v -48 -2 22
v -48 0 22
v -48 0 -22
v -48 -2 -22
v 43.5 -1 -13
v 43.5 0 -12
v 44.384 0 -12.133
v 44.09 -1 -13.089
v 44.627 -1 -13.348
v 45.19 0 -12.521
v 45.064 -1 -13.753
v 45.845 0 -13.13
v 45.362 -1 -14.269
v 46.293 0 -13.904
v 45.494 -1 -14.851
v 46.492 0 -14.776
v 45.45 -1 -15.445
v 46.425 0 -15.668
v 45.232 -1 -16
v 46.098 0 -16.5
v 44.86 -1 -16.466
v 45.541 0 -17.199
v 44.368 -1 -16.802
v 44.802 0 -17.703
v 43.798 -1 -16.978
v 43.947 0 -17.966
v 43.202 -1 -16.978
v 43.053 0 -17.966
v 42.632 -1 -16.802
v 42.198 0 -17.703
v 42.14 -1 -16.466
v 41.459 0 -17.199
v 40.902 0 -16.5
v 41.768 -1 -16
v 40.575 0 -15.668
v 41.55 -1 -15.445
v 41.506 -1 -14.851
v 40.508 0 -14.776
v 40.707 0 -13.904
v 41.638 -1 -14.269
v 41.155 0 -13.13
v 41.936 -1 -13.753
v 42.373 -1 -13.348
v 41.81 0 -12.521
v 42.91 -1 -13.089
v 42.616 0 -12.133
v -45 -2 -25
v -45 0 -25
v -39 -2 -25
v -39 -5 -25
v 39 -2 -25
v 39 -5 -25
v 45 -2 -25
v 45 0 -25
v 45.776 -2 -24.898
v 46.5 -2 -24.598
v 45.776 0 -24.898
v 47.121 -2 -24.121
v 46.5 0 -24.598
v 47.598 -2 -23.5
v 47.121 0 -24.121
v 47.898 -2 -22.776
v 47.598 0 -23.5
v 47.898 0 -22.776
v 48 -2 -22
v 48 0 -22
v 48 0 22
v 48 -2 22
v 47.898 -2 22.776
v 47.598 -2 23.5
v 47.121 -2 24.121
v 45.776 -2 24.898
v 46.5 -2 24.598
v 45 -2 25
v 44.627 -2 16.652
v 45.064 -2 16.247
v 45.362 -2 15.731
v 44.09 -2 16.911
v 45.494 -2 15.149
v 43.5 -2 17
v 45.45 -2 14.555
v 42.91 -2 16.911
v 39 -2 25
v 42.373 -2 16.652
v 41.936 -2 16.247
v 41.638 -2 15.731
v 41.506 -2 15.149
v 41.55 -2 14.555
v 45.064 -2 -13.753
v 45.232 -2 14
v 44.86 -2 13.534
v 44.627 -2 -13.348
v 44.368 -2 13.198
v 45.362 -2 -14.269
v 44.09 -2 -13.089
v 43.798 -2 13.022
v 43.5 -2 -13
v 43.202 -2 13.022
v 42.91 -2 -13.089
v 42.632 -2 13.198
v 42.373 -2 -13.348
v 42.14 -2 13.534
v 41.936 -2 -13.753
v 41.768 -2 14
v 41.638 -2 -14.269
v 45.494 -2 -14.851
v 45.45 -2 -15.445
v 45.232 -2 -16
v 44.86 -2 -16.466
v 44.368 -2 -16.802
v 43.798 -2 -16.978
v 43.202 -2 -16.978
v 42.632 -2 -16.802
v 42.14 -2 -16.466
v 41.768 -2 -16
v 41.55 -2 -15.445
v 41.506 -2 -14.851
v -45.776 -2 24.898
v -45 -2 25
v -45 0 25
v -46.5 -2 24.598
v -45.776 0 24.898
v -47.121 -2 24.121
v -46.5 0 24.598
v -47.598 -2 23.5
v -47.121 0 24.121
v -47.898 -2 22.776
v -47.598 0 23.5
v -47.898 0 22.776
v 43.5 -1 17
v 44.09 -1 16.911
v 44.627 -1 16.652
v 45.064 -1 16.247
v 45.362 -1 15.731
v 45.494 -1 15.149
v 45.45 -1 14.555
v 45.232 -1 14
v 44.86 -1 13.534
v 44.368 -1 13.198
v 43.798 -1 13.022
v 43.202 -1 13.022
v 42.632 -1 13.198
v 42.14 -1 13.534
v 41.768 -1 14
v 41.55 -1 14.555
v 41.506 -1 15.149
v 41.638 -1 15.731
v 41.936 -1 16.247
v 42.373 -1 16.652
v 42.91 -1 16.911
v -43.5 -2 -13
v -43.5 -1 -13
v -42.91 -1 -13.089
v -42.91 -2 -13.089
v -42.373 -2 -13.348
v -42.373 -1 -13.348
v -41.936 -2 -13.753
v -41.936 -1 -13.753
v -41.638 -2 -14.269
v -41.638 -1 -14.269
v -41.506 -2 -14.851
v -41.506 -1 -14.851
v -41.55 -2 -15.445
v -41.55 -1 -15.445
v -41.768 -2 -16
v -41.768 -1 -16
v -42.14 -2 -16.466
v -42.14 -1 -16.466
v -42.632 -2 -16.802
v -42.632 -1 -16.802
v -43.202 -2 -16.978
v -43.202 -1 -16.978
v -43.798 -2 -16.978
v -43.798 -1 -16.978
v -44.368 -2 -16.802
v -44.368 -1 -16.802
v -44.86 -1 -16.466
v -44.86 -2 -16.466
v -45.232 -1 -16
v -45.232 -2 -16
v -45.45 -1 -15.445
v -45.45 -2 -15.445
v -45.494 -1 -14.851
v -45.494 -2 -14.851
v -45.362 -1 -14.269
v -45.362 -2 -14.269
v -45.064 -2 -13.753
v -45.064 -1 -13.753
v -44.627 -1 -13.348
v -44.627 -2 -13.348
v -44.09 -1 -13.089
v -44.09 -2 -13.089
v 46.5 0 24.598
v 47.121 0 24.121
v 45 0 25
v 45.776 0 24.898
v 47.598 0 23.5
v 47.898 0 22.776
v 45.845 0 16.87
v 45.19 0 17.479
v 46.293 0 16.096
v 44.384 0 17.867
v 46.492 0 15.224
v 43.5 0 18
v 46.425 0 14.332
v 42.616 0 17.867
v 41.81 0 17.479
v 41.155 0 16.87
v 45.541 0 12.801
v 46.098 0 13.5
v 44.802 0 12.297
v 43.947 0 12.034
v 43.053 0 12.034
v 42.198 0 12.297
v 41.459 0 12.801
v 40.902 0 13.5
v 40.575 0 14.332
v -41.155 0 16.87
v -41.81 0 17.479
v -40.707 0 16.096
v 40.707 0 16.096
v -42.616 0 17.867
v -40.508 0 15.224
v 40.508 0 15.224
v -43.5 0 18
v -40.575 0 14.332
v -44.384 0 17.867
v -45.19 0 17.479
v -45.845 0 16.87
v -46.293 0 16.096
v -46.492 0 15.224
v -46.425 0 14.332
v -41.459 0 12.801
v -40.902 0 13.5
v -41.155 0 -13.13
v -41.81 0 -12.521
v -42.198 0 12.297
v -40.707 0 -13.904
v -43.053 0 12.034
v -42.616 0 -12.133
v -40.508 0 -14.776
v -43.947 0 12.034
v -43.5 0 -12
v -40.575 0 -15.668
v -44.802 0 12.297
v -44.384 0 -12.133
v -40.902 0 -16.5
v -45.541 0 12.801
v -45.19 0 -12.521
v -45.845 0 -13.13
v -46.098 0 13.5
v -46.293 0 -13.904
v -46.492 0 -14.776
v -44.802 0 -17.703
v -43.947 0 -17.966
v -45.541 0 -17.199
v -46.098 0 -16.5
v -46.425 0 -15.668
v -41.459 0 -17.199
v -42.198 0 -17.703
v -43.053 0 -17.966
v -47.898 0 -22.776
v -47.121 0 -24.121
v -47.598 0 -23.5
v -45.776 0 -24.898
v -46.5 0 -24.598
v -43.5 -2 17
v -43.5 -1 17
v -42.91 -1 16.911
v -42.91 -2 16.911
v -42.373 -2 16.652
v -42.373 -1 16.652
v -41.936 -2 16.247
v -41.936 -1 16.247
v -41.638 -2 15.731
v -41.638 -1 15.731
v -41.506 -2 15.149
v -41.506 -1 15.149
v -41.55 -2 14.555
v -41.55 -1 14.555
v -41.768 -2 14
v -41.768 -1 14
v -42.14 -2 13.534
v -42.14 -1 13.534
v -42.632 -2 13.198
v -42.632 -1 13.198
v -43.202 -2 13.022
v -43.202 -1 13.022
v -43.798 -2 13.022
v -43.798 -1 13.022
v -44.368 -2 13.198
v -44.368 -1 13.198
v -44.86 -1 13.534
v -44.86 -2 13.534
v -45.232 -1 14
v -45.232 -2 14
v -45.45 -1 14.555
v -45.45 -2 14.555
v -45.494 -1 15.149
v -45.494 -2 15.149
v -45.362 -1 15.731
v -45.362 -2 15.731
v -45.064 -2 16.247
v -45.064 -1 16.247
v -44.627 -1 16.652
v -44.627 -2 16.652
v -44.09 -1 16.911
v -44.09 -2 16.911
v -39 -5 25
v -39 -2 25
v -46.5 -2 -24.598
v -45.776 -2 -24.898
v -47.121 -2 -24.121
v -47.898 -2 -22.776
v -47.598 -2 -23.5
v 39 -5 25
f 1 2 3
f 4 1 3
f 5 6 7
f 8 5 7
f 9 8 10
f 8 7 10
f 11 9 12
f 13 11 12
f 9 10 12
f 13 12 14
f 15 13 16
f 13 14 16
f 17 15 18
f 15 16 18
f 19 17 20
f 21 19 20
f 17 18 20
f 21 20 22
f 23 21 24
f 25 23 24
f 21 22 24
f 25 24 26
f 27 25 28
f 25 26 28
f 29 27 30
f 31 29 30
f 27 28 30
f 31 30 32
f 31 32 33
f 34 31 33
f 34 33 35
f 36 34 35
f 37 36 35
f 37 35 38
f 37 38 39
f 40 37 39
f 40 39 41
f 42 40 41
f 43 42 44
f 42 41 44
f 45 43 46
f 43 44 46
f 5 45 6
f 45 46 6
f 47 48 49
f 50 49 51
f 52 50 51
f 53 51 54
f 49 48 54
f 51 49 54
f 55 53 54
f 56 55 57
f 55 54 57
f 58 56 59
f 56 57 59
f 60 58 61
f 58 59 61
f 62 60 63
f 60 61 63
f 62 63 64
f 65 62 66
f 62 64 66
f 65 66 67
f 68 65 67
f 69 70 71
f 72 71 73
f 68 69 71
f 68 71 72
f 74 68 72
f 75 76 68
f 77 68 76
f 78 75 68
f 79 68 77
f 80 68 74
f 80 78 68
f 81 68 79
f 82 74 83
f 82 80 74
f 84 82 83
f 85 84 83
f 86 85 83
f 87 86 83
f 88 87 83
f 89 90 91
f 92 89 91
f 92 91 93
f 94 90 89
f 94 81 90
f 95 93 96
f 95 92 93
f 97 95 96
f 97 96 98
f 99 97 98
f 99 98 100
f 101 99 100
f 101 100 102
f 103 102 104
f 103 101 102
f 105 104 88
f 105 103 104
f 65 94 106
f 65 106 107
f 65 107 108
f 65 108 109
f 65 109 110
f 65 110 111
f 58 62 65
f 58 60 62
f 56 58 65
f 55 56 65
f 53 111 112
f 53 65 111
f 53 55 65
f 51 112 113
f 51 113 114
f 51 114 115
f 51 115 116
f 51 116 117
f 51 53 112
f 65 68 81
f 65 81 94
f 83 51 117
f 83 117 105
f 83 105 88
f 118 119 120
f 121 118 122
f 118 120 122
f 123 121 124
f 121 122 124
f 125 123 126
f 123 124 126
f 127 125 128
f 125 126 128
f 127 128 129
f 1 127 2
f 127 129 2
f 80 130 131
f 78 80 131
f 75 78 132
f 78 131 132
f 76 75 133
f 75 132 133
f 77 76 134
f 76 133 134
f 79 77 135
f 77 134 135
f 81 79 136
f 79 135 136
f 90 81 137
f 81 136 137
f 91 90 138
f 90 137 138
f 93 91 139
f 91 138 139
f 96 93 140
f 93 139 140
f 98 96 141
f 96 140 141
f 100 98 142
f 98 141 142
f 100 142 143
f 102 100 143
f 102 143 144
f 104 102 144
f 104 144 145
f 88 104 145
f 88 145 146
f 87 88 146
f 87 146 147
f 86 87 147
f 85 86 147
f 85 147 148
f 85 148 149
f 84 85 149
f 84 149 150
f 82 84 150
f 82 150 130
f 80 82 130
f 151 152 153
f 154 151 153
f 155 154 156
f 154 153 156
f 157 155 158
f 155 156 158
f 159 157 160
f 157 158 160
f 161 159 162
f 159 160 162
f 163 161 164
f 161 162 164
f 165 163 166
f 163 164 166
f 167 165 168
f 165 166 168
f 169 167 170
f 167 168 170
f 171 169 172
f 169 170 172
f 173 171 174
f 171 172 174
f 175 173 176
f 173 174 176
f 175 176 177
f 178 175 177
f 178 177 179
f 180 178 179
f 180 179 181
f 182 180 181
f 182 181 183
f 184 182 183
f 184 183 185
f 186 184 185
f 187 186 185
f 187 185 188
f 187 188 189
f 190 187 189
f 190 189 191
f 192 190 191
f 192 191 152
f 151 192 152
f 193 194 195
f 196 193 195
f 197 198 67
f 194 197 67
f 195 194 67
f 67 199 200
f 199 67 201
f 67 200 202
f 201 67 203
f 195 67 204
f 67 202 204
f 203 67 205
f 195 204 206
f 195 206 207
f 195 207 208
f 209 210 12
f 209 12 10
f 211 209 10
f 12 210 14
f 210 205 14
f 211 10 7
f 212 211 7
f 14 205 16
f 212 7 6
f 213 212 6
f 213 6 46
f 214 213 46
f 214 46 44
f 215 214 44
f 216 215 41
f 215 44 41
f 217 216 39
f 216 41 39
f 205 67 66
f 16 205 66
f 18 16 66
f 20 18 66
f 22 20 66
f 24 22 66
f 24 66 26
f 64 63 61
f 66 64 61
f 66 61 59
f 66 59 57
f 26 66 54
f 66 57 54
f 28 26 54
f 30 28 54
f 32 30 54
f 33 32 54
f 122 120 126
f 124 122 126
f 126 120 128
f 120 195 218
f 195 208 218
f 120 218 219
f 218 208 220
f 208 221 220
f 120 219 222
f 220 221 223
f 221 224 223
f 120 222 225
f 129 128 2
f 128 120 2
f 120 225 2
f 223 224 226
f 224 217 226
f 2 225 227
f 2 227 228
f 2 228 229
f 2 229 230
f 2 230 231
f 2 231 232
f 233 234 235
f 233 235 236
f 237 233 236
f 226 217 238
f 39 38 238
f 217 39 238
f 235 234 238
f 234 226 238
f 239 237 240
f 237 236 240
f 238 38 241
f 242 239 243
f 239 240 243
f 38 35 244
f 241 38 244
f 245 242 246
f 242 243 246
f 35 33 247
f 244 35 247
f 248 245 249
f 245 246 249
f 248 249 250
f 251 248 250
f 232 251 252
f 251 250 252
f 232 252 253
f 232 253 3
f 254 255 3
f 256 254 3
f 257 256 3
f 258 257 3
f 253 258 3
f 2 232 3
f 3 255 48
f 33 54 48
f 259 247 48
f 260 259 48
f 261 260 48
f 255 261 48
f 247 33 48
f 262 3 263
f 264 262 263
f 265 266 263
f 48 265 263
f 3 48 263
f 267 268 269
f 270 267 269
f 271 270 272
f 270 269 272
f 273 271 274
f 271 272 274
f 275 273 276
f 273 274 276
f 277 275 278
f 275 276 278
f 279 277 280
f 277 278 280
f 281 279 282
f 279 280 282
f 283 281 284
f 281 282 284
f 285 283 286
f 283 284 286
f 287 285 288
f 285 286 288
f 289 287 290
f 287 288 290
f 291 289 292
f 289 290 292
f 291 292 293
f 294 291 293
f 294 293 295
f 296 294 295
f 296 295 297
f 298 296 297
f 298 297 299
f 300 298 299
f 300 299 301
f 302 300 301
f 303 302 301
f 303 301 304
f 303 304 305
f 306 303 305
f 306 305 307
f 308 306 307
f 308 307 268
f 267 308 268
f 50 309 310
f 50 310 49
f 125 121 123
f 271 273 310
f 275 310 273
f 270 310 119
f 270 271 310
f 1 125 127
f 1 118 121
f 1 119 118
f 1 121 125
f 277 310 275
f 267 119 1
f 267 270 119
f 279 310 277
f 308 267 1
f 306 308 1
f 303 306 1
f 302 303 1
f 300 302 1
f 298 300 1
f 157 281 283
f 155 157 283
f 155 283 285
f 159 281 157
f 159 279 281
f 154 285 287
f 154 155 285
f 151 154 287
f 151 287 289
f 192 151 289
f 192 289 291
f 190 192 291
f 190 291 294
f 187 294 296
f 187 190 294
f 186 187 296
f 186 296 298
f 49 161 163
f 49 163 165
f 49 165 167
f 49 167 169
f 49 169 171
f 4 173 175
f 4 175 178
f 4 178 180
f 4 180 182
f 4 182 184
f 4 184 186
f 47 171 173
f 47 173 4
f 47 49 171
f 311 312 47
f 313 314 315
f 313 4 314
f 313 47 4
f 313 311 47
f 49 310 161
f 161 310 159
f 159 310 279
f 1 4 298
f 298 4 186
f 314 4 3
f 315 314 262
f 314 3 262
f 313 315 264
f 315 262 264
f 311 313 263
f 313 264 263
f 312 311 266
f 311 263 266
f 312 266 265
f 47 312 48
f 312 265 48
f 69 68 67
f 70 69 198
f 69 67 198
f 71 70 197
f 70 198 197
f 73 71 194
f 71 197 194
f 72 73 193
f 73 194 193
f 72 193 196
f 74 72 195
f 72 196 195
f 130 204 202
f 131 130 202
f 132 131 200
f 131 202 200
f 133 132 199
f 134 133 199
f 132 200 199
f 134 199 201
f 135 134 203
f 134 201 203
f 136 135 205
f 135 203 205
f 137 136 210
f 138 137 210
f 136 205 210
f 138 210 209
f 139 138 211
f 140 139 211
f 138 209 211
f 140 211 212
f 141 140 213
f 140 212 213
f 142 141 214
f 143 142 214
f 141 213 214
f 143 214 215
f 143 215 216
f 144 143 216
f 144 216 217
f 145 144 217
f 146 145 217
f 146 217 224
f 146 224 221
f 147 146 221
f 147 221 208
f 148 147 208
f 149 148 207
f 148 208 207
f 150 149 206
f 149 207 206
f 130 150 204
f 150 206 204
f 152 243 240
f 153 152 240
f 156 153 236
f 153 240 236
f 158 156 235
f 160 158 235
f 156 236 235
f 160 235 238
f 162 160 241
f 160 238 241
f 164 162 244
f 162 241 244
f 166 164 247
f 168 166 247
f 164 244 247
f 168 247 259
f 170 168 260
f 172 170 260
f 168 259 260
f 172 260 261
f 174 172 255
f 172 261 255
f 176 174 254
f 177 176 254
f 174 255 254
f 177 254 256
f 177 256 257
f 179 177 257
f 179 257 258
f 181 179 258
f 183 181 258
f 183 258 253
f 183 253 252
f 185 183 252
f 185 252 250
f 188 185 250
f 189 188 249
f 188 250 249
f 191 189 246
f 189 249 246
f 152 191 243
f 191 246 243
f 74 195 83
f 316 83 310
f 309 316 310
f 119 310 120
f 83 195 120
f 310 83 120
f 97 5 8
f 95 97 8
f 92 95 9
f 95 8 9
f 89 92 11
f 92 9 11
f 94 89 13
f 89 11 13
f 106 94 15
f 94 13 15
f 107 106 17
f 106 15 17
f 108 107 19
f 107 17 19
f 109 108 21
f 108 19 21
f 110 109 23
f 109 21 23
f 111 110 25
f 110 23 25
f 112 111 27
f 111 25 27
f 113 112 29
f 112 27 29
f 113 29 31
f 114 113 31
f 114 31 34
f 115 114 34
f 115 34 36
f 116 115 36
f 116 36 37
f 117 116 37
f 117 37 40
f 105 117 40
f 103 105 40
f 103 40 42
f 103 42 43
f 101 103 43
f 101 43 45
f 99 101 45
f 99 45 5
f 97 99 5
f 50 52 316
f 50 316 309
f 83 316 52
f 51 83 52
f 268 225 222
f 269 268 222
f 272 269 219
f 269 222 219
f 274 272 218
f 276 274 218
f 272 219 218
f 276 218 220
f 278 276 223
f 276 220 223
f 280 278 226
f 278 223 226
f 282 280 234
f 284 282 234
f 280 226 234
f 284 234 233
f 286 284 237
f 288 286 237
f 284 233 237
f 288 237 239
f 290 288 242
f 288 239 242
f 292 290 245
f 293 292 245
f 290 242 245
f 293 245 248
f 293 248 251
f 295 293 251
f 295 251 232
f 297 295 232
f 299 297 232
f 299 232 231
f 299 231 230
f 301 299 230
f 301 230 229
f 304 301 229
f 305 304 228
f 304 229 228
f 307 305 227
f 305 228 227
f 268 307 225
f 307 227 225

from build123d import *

# Parameters (mm, degrees)
ESQUISSE1_R             = 2
BOSS_EXTRU_1_DEPTH      = 5
CHANFREIN1_SIZE         = 1
ESQUISSE2_W             = 9
ESQUISSE2_H             = 50
ENL_V_MAT_EXTRU_1_DEPTH = 3


with BuildPart() as part:
    # Esquisse1 → Boss.-Extru.1 (new body)
    with BuildSketch(Plane(origin=(0, 0, 0), x_dir=(1, 0, 0), z_dir=(0, 1, 0))):
        with BuildLine():
            Line((-45, 25), (45, 25))
            ThreePointArc((45, 25), (47.121320344, 24.121320344), (48, 22))
            Line((48, 22), (48, -22))
            ThreePointArc((48, -22), (47.121320344, -24.121320344), (45, -25))
            Line((45, -25), (-45, -25))
            ThreePointArc((-45, -25), (-47.121320344, -24.121320344), (-48, -22))
            Line((-48, -22), (-48, 22))
            ThreePointArc((-48, 22), (-47.121320344, 24.121320344), (-45, 25))
        make_face()
        with Locations(Location((-43.5, 15, 0), (0, 0, 270))):
            Circle(ESQUISSE1_R, mode=Mode.SUBTRACT)
        with Locations(Location((43.5, 15, 0), (0, 0, 270))):
            Circle(ESQUISSE1_R, mode=Mode.SUBTRACT)
        with Locations(Location((43.5, -15, 0), (0, 0, 270))):
            Circle(ESQUISSE1_R, mode=Mode.SUBTRACT)
        with Locations(Location((-43.5, -15, 0), (0, 0, 270))):
            Circle(ESQUISSE1_R, mode=Mode.SUBTRACT)
    extrude(amount=-BOSS_EXTRU_1_DEPTH)

    # Chanfrein1
    chanfrein1_edges = [part.edges().sort_by_distance(p)[0] for p in [
        (-43.5, 0, -17),
        (43.5, 0, -17),
        (43.5, 0, 13),
        (-43.5, 0, 13),
    ]]
    chamfer(chanfrein1_edges, length=CHANFREIN1_SIZE)

    # Esquisse2 → Enlèv. mat.-Extru.1 (cut)
    with BuildSketch(Plane(origin=(0, -5, 0), x_dir=(-1, 0, 0), z_dir=(0, -1, 0))):
        with Locations((43.5, 0)):
            Rectangle(ESQUISSE2_W, ESQUISSE2_H)
        with Locations((-43.5, 0)):
            Rectangle(ESQUISSE2_W, ESQUISSE2_H)
    extrude(amount=-ENL_V_MAT_EXTRU_1_DEPTH, mode=Mode.SUBTRACT)


solid = part.part
